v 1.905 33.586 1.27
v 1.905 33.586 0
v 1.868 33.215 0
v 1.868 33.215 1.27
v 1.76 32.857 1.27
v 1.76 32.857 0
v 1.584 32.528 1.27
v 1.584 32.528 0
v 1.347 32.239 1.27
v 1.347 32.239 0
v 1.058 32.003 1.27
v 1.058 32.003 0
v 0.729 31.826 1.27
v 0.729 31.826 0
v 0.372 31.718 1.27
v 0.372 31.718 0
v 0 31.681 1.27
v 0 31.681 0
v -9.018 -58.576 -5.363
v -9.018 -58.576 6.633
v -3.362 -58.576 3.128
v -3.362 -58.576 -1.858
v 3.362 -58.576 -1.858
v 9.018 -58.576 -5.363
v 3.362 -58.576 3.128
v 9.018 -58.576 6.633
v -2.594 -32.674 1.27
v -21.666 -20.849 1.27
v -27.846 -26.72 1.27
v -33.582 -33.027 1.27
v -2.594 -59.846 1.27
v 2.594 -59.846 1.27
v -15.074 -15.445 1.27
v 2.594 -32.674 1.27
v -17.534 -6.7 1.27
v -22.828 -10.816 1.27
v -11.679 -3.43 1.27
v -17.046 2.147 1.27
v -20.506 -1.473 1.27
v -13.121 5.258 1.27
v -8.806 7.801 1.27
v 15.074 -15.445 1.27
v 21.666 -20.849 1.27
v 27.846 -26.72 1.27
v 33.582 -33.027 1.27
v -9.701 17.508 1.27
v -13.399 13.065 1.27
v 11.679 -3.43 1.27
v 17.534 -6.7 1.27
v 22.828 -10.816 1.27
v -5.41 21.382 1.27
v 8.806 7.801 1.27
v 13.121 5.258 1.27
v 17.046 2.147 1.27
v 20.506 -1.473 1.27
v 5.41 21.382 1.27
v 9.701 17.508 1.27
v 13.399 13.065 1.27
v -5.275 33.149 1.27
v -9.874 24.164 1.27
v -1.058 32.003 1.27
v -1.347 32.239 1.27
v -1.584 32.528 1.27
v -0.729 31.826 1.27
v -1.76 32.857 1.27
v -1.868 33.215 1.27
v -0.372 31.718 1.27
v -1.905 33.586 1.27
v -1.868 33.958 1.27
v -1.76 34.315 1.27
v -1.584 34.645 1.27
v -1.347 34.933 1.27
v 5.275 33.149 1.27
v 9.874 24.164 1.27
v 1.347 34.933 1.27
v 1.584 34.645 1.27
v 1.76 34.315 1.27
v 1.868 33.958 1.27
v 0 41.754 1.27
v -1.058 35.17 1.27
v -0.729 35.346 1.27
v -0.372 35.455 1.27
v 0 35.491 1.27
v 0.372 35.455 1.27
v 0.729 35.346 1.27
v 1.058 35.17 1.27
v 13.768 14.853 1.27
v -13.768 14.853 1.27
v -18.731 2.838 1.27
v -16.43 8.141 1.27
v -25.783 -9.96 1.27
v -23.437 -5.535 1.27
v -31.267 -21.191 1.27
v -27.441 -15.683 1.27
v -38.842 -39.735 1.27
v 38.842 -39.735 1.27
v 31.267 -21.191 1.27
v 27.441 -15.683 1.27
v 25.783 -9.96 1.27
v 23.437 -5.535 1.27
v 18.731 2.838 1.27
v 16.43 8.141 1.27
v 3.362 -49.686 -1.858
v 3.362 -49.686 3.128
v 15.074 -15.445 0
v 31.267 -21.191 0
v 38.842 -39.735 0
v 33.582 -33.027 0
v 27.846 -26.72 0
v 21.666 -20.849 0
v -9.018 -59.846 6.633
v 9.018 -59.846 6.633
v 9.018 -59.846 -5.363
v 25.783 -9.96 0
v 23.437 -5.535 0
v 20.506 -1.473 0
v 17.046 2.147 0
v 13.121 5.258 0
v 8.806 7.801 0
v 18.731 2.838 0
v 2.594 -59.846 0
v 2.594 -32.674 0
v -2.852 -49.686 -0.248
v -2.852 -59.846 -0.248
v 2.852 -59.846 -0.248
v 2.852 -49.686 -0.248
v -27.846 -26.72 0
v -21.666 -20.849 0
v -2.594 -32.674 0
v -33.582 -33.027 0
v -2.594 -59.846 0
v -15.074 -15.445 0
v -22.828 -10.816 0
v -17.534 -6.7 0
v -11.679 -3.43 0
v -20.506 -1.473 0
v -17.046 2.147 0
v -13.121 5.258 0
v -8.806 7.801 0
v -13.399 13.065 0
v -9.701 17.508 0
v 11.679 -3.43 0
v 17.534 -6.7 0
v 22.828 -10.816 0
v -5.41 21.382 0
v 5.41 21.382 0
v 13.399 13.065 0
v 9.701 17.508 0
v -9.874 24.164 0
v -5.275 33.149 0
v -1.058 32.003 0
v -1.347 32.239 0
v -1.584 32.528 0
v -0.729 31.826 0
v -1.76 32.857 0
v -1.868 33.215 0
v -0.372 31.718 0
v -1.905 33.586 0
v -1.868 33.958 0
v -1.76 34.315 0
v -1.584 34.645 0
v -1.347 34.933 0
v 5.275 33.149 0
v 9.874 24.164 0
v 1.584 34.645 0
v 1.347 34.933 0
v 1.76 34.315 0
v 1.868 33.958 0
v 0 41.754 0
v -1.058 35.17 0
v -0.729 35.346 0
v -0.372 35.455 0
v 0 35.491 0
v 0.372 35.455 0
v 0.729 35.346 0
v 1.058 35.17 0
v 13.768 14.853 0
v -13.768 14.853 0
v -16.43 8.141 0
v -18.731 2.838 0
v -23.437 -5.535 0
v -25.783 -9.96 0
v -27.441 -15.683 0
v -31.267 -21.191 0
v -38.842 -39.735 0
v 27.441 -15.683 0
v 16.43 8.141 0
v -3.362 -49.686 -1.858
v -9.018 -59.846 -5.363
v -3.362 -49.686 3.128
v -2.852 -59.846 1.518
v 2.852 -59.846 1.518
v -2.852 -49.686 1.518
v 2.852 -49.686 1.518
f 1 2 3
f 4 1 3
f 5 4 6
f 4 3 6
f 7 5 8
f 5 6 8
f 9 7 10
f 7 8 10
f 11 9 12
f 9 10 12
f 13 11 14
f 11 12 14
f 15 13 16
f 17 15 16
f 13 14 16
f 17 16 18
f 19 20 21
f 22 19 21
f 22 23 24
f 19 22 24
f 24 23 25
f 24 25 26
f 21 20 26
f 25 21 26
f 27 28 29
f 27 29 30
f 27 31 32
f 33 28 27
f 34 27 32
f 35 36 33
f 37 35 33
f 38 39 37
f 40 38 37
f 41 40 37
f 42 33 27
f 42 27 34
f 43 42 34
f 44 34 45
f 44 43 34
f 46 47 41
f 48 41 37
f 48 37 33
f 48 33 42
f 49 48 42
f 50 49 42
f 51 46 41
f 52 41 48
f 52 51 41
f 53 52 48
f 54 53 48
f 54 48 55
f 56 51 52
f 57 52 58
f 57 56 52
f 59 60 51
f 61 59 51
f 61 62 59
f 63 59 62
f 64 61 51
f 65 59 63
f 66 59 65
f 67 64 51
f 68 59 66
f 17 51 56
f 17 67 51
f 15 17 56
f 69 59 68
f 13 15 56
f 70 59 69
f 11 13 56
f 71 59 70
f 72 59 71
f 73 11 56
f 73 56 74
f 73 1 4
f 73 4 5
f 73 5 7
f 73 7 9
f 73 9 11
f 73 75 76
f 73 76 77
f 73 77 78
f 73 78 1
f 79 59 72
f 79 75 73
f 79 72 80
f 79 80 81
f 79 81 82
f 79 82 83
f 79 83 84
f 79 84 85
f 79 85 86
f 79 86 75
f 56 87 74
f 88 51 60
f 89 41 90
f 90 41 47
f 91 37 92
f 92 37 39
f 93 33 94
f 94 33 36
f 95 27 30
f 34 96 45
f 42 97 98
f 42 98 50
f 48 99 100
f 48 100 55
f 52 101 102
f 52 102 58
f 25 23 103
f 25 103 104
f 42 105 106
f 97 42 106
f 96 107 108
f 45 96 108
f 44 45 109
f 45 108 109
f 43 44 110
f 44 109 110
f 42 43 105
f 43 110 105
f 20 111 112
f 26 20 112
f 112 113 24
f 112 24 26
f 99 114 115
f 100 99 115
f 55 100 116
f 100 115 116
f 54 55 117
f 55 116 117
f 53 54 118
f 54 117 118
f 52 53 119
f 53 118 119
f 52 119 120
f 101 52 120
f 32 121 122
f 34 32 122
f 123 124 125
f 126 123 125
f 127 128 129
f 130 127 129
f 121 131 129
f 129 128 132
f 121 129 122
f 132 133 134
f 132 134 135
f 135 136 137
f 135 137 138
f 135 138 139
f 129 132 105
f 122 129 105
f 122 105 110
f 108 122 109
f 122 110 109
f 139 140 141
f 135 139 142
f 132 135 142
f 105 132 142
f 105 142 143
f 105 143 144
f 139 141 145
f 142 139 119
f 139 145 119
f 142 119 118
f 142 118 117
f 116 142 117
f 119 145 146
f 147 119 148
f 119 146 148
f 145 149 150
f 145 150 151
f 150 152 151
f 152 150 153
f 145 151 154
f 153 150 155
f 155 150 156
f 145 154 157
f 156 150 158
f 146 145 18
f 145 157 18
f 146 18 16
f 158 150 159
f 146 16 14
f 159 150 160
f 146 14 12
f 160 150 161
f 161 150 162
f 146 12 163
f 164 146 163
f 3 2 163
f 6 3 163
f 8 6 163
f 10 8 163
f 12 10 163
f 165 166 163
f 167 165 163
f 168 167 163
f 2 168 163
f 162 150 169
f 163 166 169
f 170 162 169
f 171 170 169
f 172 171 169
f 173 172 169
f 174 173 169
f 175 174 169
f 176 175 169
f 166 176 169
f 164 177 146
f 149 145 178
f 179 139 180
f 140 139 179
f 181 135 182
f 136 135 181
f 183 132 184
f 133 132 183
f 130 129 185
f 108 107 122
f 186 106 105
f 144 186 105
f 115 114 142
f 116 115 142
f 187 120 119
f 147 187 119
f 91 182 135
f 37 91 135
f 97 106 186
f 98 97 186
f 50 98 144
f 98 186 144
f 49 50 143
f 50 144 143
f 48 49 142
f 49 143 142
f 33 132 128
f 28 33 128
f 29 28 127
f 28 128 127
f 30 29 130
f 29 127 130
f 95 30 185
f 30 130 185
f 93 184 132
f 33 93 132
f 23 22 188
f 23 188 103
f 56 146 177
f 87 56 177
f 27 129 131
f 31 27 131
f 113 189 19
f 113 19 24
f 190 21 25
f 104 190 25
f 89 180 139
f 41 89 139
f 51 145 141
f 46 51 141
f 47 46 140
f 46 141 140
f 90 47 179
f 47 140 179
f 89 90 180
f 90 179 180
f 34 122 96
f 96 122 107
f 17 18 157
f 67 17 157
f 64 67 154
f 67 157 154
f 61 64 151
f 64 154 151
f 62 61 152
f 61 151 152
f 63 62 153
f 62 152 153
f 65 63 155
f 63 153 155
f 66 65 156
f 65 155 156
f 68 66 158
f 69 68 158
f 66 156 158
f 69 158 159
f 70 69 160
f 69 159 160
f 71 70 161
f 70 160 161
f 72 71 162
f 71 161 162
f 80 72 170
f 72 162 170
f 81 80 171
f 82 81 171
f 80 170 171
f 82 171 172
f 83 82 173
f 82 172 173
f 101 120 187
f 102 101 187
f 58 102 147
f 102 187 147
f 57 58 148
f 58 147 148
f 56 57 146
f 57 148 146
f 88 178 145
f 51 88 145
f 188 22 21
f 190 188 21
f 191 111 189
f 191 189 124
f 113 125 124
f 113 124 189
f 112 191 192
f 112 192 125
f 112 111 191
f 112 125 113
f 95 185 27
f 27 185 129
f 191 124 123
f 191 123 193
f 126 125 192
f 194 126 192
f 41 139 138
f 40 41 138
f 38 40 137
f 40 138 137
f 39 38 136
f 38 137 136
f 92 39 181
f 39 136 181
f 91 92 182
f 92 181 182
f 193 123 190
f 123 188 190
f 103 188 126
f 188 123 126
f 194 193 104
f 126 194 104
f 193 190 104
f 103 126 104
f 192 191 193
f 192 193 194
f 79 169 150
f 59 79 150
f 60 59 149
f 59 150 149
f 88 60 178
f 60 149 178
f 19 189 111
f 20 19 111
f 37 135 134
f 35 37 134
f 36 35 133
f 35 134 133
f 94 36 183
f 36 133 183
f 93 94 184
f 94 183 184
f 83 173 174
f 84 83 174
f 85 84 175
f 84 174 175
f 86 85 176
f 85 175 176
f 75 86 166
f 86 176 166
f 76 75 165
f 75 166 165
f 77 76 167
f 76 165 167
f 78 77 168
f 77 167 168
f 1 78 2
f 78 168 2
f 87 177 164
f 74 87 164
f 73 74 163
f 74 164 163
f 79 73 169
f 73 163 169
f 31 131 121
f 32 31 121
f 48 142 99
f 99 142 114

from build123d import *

# Parameters (mm, degrees)
F1_DEPTH = 1.27
F2_W     = 6.723348
F2_H     = 4.986004
F2_W_2   = 5.703948
F2_H_2   = 1.765178
F3_DEPTH = 10.16
F2_W_3   = 18.036448
F2_H_3   = 11.996722
F4_DEPTH = 1.27


with BuildPart() as f1:
    # F0 (on Top) → F1 (new body)
    with BuildSketch(Plane.XY):
        with BuildLine():
            ThreePointArc((13.768193, 14.852569), (7.661095, 28.701133), (0, 41.75437))
            Line((0, 41.75437), (0, 35.491454))
            ThreePointArc((0, 35.491454), (1.347038, 34.933492), (1.905, 33.586454))
            ThreePointArc((1.905, 33.586454), (1.347038, 32.239415), (0, 31.681454))
            Line((0, 31.681454), (0, -59.84563))
            Line((0, -59.84563), (2.594433, -59.84563))
            Line((2.594433, -59.84563), (2.594433, -32.674071))
            Line((2.594433, -32.674071), (38.841712, -39.734574))
            ThreePointArc((38.841712, -39.734574), (27.846151, -26.720447), (15.074104, -15.444602))
            Line((15.074104, -15.444602), (31.267419, -21.190618))
            ThreePointArc((31.267419, -21.190618), (22.828383, -10.815589), (11.678733, -3.430206))
            Line((11.678733, -3.430206), (25.782588, -9.959769))
            ThreePointArc((25.782588, -9.959769), (18.838181, 0.396342), (8.805725, 7.800641))
            Line((8.805725, 7.800641), (18.730659, 2.838174))
            ThreePointArc((18.730659, 2.838174), (13.399286, 13.064628), (5.410352, 21.382131))
            Line((5.410352, 21.382131), (13.768193, 14.852569))
        make_face()
        with BuildLine():
            Line((0, 35.491454), (0, 41.75437))
            ThreePointArc((0, 41.75437), (-7.661095, 28.701133), (-13.768193, 14.852569))
            Line((-13.768193, 14.852569), (-5.410352, 21.382131))
            ThreePointArc((-5.410352, 21.382131), (-13.399286, 13.064628), (-18.730659, 2.838174))
            Line((-18.730659, 2.838174), (-8.805725, 7.800641))
            ThreePointArc((-8.805725, 7.800641), (-18.838181, 0.396342), (-25.782588, -9.959769))
            Line((-25.782588, -9.959769), (-11.678733, -3.430206))
            ThreePointArc((-11.678733, -3.430206), (-22.828383, -10.815589), (-31.267419, -21.190618))
            Line((-31.267419, -21.190618), (-15.074104, -15.444602))
            ThreePointArc((-15.074104, -15.444602), (-27.846151, -26.720447), (-38.841712, -39.734574))
            Line((-38.841712, -39.734574), (-2.594433, -32.674071))
            Line((-2.594433, -32.674071), (-2.594433, -59.84563))
            Line((-2.594433, -59.84563), (0, -59.84563))
            Line((0, -59.84563), (0, 31.681454))
            ThreePointArc((0, 31.681454), (-1.905, 33.586454), (0, 35.491454))
        make_face()
    extrude(amount=F1_DEPTH)


with BuildPart() as f3:
    # F2 (on face) → F3 (new body)
    with BuildSketch(Plane.XZ.offset(59.84563)):
        with Locations((0, 0.635)):
            Rectangle(F2_W, F2_H)
        with Locations((0, 0.635)):
            Rectangle(F2_W_2, F2_H_2, mode=Mode.SUBTRACT)
    extrude(amount=-F3_DEPTH)

    # F2 (on face) → F4 (join)
    with BuildSketch(Plane.XZ.offset(59.84563)):
        with Locations((0, 0.635)):
            Rectangle(F2_W_3, F2_H_3)
        with Locations((0, 0.635)):
            Rectangle(F2_W, F2_H, mode=Mode.SUBTRACT)
        with Locations((0, 0.635)):
            Rectangle(F2_W, F2_H)
        with Locations((0, 0.635)):
            Rectangle(F2_W_2, F2_H_2, mode=Mode.SUBTRACT)
    extrude(amount=-F4_DEPTH)


solid = Compound([f1.part, f3.part])
